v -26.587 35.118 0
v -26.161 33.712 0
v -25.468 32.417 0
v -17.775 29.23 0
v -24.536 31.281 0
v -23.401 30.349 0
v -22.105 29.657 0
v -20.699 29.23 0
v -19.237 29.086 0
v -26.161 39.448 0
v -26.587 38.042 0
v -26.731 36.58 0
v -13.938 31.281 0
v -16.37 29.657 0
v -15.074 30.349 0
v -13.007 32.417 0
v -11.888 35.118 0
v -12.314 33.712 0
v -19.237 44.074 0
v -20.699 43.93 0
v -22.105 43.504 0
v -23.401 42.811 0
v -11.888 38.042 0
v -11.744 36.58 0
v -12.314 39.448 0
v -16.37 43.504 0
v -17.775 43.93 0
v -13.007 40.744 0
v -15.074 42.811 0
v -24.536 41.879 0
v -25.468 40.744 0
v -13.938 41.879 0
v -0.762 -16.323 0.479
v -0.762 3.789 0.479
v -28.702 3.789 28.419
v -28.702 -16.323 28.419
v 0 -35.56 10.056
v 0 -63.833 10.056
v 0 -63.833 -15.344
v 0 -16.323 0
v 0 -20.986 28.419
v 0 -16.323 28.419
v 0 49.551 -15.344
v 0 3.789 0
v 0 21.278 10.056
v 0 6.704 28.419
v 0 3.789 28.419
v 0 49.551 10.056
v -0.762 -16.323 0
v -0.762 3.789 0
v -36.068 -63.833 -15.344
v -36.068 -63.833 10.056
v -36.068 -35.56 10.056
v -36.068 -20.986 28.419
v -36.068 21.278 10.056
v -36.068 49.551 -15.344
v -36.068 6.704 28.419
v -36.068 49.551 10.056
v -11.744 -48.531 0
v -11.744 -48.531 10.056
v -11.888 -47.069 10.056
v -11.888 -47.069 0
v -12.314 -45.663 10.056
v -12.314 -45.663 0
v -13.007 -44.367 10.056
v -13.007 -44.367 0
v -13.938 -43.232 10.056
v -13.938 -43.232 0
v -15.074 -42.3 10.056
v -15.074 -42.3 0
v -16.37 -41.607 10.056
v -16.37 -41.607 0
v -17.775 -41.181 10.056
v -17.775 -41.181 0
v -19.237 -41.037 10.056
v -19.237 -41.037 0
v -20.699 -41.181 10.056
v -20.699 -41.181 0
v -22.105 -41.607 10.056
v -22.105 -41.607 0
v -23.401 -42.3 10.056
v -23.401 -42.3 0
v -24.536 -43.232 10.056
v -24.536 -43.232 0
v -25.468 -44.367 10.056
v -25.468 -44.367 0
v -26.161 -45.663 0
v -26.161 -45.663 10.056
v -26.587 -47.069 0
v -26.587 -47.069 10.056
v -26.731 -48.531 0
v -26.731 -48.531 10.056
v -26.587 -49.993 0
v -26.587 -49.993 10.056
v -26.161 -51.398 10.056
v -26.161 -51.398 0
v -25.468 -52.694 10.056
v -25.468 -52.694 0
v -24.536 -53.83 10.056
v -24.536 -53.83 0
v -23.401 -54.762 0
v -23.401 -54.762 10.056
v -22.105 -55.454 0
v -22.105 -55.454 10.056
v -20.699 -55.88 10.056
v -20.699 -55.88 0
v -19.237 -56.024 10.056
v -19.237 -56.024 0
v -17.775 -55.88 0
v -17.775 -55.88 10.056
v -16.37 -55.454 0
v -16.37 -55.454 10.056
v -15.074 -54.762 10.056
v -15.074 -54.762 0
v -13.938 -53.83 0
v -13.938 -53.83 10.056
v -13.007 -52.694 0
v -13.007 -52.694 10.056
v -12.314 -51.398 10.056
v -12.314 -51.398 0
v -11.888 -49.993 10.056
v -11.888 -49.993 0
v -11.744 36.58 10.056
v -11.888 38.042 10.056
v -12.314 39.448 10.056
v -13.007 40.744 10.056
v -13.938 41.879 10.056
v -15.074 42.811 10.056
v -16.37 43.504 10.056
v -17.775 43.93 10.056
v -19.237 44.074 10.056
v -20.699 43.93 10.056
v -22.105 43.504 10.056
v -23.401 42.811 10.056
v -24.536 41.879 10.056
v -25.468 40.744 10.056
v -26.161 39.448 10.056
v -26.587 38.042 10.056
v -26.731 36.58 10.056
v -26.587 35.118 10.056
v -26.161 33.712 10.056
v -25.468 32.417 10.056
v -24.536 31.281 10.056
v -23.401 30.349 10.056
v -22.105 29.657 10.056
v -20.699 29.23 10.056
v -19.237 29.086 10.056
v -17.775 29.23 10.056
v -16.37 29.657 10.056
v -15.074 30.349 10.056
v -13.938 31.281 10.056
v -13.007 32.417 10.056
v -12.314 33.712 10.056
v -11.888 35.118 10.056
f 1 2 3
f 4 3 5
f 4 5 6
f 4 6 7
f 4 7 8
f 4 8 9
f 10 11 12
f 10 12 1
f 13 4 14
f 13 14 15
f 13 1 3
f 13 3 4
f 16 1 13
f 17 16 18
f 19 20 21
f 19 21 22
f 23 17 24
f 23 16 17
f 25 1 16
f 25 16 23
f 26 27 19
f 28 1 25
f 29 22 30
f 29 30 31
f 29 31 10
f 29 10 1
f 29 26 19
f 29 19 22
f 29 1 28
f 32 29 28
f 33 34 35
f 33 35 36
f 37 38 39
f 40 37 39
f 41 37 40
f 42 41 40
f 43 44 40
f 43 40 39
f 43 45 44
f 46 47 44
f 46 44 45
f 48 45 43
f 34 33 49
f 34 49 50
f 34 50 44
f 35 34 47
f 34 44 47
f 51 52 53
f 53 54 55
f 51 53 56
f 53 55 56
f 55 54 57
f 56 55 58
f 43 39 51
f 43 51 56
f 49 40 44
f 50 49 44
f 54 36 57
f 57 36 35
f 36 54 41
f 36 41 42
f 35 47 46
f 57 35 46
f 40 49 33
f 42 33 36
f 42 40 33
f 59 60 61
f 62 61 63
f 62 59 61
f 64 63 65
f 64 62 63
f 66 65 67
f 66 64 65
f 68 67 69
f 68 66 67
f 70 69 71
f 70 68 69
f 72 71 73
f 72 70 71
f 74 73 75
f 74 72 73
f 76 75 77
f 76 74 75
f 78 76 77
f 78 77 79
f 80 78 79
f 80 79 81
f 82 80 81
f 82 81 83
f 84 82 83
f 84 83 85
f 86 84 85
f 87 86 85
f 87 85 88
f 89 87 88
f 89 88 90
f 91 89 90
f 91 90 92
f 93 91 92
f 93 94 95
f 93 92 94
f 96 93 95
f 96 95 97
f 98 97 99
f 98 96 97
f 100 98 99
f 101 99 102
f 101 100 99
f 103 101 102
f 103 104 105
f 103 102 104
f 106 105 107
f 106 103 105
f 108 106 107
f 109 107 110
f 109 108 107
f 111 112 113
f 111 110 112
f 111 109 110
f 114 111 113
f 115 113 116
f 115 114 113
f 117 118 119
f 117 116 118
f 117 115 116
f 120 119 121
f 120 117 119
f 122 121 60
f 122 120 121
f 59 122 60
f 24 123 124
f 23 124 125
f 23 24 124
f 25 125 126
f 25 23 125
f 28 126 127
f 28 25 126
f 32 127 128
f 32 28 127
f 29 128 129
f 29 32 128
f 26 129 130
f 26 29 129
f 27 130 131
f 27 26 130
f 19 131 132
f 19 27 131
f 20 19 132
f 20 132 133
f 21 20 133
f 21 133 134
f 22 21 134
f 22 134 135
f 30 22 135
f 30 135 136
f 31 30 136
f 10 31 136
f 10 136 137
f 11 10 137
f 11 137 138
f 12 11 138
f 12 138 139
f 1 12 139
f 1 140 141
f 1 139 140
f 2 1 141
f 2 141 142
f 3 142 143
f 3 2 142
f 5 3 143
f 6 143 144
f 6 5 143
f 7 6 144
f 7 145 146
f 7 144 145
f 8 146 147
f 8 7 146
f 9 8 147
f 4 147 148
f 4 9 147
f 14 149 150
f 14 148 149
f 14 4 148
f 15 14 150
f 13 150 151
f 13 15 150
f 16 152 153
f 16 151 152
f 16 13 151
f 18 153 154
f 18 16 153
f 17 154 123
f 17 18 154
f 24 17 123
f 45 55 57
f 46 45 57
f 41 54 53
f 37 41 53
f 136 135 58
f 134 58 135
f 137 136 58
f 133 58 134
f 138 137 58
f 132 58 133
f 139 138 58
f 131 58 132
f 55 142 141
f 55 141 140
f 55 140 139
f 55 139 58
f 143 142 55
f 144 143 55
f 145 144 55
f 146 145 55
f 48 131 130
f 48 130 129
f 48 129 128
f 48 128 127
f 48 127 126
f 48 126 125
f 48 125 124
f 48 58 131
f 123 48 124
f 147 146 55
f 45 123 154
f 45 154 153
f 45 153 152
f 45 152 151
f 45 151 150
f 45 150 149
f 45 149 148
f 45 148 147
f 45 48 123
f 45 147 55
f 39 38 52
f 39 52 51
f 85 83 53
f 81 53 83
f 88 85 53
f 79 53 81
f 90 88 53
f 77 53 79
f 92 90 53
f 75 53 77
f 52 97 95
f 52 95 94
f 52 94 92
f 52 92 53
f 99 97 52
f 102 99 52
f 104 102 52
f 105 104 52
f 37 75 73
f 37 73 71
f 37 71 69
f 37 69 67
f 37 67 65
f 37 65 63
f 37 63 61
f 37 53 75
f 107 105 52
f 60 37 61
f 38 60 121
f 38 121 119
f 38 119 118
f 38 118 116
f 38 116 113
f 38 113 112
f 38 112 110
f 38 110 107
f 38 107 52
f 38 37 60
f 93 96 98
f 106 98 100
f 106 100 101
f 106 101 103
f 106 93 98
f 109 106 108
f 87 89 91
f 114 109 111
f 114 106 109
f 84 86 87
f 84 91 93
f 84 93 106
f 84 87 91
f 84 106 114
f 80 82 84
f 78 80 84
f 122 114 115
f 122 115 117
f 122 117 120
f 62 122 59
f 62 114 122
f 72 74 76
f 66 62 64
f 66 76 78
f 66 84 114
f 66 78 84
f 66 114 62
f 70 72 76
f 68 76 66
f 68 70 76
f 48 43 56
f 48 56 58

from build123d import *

# Parameters (mm, degrees)
F0_W     = 27.6901638135
F0_H     = 18.3629523963
F1_DEPTH = 36.068
F2_R     = 7.4938109385
F2_R_2   = 7.4938128
F3_DEPTH = 57.404
F4_W     = 20.1118043624
F4_H     = 29.0018040687
F5_DEPTH = 0.762
F6_SIZE  = 27.94


with BuildPart() as f1:
    # F0 (on Right) → F1 (new body)
    with BuildSketch(Plane.YZ):
        Polygon((-35.5600006878, 10.0559014827), (-63.8331216878, 10.0559014827), (-63.8331216878, -15.3440985173), (49.550820142, -15.3440985173), (49.550820142, 10.0559014827), (21.2777052075, 10.0559014827), (6.7039346322, 28.418853879), (6.7039346322, 10.0559014827), (-20.9862291813, 10.0559014827), (-20.9862291813, 28.418853879), align=None)
        with Locations((-7.1411472745, 19.2373776808)):
            Rectangle(F0_W, F0_H)
    extrude(amount=-F1_DEPTH)

    # F2 (on Top) → F3 (cut)
    with BuildSketch(Plane.XY):
        with Locations((-19.2373786122, -48.5306568444)):
            Circle(F2_R)
        with Locations((-19.2373786122, 36.5801639855)):
            Circle(F2_R_2)
    extrude(amount=F3_DEPTH, mode=Mode.SUBTRACT)

    # F4 (on Right) → F5 (cut)
    with BuildSketch(Plane.YZ):
        with Locations((-6.2667217571, 14.5009020343)):
            Rectangle(F4_W, F4_H)
    extrude(amount=-F5_DEPTH, mode=Mode.SUBTRACT)

    # F6
    f6_edges = [f1.edges().sort_by_distance(p)[0] for p in [
        (-0.762, -6.266722, 28.418854),
    ]]
    chamfer(f6_edges, length=F6_SIZE)


solid = f1.part
